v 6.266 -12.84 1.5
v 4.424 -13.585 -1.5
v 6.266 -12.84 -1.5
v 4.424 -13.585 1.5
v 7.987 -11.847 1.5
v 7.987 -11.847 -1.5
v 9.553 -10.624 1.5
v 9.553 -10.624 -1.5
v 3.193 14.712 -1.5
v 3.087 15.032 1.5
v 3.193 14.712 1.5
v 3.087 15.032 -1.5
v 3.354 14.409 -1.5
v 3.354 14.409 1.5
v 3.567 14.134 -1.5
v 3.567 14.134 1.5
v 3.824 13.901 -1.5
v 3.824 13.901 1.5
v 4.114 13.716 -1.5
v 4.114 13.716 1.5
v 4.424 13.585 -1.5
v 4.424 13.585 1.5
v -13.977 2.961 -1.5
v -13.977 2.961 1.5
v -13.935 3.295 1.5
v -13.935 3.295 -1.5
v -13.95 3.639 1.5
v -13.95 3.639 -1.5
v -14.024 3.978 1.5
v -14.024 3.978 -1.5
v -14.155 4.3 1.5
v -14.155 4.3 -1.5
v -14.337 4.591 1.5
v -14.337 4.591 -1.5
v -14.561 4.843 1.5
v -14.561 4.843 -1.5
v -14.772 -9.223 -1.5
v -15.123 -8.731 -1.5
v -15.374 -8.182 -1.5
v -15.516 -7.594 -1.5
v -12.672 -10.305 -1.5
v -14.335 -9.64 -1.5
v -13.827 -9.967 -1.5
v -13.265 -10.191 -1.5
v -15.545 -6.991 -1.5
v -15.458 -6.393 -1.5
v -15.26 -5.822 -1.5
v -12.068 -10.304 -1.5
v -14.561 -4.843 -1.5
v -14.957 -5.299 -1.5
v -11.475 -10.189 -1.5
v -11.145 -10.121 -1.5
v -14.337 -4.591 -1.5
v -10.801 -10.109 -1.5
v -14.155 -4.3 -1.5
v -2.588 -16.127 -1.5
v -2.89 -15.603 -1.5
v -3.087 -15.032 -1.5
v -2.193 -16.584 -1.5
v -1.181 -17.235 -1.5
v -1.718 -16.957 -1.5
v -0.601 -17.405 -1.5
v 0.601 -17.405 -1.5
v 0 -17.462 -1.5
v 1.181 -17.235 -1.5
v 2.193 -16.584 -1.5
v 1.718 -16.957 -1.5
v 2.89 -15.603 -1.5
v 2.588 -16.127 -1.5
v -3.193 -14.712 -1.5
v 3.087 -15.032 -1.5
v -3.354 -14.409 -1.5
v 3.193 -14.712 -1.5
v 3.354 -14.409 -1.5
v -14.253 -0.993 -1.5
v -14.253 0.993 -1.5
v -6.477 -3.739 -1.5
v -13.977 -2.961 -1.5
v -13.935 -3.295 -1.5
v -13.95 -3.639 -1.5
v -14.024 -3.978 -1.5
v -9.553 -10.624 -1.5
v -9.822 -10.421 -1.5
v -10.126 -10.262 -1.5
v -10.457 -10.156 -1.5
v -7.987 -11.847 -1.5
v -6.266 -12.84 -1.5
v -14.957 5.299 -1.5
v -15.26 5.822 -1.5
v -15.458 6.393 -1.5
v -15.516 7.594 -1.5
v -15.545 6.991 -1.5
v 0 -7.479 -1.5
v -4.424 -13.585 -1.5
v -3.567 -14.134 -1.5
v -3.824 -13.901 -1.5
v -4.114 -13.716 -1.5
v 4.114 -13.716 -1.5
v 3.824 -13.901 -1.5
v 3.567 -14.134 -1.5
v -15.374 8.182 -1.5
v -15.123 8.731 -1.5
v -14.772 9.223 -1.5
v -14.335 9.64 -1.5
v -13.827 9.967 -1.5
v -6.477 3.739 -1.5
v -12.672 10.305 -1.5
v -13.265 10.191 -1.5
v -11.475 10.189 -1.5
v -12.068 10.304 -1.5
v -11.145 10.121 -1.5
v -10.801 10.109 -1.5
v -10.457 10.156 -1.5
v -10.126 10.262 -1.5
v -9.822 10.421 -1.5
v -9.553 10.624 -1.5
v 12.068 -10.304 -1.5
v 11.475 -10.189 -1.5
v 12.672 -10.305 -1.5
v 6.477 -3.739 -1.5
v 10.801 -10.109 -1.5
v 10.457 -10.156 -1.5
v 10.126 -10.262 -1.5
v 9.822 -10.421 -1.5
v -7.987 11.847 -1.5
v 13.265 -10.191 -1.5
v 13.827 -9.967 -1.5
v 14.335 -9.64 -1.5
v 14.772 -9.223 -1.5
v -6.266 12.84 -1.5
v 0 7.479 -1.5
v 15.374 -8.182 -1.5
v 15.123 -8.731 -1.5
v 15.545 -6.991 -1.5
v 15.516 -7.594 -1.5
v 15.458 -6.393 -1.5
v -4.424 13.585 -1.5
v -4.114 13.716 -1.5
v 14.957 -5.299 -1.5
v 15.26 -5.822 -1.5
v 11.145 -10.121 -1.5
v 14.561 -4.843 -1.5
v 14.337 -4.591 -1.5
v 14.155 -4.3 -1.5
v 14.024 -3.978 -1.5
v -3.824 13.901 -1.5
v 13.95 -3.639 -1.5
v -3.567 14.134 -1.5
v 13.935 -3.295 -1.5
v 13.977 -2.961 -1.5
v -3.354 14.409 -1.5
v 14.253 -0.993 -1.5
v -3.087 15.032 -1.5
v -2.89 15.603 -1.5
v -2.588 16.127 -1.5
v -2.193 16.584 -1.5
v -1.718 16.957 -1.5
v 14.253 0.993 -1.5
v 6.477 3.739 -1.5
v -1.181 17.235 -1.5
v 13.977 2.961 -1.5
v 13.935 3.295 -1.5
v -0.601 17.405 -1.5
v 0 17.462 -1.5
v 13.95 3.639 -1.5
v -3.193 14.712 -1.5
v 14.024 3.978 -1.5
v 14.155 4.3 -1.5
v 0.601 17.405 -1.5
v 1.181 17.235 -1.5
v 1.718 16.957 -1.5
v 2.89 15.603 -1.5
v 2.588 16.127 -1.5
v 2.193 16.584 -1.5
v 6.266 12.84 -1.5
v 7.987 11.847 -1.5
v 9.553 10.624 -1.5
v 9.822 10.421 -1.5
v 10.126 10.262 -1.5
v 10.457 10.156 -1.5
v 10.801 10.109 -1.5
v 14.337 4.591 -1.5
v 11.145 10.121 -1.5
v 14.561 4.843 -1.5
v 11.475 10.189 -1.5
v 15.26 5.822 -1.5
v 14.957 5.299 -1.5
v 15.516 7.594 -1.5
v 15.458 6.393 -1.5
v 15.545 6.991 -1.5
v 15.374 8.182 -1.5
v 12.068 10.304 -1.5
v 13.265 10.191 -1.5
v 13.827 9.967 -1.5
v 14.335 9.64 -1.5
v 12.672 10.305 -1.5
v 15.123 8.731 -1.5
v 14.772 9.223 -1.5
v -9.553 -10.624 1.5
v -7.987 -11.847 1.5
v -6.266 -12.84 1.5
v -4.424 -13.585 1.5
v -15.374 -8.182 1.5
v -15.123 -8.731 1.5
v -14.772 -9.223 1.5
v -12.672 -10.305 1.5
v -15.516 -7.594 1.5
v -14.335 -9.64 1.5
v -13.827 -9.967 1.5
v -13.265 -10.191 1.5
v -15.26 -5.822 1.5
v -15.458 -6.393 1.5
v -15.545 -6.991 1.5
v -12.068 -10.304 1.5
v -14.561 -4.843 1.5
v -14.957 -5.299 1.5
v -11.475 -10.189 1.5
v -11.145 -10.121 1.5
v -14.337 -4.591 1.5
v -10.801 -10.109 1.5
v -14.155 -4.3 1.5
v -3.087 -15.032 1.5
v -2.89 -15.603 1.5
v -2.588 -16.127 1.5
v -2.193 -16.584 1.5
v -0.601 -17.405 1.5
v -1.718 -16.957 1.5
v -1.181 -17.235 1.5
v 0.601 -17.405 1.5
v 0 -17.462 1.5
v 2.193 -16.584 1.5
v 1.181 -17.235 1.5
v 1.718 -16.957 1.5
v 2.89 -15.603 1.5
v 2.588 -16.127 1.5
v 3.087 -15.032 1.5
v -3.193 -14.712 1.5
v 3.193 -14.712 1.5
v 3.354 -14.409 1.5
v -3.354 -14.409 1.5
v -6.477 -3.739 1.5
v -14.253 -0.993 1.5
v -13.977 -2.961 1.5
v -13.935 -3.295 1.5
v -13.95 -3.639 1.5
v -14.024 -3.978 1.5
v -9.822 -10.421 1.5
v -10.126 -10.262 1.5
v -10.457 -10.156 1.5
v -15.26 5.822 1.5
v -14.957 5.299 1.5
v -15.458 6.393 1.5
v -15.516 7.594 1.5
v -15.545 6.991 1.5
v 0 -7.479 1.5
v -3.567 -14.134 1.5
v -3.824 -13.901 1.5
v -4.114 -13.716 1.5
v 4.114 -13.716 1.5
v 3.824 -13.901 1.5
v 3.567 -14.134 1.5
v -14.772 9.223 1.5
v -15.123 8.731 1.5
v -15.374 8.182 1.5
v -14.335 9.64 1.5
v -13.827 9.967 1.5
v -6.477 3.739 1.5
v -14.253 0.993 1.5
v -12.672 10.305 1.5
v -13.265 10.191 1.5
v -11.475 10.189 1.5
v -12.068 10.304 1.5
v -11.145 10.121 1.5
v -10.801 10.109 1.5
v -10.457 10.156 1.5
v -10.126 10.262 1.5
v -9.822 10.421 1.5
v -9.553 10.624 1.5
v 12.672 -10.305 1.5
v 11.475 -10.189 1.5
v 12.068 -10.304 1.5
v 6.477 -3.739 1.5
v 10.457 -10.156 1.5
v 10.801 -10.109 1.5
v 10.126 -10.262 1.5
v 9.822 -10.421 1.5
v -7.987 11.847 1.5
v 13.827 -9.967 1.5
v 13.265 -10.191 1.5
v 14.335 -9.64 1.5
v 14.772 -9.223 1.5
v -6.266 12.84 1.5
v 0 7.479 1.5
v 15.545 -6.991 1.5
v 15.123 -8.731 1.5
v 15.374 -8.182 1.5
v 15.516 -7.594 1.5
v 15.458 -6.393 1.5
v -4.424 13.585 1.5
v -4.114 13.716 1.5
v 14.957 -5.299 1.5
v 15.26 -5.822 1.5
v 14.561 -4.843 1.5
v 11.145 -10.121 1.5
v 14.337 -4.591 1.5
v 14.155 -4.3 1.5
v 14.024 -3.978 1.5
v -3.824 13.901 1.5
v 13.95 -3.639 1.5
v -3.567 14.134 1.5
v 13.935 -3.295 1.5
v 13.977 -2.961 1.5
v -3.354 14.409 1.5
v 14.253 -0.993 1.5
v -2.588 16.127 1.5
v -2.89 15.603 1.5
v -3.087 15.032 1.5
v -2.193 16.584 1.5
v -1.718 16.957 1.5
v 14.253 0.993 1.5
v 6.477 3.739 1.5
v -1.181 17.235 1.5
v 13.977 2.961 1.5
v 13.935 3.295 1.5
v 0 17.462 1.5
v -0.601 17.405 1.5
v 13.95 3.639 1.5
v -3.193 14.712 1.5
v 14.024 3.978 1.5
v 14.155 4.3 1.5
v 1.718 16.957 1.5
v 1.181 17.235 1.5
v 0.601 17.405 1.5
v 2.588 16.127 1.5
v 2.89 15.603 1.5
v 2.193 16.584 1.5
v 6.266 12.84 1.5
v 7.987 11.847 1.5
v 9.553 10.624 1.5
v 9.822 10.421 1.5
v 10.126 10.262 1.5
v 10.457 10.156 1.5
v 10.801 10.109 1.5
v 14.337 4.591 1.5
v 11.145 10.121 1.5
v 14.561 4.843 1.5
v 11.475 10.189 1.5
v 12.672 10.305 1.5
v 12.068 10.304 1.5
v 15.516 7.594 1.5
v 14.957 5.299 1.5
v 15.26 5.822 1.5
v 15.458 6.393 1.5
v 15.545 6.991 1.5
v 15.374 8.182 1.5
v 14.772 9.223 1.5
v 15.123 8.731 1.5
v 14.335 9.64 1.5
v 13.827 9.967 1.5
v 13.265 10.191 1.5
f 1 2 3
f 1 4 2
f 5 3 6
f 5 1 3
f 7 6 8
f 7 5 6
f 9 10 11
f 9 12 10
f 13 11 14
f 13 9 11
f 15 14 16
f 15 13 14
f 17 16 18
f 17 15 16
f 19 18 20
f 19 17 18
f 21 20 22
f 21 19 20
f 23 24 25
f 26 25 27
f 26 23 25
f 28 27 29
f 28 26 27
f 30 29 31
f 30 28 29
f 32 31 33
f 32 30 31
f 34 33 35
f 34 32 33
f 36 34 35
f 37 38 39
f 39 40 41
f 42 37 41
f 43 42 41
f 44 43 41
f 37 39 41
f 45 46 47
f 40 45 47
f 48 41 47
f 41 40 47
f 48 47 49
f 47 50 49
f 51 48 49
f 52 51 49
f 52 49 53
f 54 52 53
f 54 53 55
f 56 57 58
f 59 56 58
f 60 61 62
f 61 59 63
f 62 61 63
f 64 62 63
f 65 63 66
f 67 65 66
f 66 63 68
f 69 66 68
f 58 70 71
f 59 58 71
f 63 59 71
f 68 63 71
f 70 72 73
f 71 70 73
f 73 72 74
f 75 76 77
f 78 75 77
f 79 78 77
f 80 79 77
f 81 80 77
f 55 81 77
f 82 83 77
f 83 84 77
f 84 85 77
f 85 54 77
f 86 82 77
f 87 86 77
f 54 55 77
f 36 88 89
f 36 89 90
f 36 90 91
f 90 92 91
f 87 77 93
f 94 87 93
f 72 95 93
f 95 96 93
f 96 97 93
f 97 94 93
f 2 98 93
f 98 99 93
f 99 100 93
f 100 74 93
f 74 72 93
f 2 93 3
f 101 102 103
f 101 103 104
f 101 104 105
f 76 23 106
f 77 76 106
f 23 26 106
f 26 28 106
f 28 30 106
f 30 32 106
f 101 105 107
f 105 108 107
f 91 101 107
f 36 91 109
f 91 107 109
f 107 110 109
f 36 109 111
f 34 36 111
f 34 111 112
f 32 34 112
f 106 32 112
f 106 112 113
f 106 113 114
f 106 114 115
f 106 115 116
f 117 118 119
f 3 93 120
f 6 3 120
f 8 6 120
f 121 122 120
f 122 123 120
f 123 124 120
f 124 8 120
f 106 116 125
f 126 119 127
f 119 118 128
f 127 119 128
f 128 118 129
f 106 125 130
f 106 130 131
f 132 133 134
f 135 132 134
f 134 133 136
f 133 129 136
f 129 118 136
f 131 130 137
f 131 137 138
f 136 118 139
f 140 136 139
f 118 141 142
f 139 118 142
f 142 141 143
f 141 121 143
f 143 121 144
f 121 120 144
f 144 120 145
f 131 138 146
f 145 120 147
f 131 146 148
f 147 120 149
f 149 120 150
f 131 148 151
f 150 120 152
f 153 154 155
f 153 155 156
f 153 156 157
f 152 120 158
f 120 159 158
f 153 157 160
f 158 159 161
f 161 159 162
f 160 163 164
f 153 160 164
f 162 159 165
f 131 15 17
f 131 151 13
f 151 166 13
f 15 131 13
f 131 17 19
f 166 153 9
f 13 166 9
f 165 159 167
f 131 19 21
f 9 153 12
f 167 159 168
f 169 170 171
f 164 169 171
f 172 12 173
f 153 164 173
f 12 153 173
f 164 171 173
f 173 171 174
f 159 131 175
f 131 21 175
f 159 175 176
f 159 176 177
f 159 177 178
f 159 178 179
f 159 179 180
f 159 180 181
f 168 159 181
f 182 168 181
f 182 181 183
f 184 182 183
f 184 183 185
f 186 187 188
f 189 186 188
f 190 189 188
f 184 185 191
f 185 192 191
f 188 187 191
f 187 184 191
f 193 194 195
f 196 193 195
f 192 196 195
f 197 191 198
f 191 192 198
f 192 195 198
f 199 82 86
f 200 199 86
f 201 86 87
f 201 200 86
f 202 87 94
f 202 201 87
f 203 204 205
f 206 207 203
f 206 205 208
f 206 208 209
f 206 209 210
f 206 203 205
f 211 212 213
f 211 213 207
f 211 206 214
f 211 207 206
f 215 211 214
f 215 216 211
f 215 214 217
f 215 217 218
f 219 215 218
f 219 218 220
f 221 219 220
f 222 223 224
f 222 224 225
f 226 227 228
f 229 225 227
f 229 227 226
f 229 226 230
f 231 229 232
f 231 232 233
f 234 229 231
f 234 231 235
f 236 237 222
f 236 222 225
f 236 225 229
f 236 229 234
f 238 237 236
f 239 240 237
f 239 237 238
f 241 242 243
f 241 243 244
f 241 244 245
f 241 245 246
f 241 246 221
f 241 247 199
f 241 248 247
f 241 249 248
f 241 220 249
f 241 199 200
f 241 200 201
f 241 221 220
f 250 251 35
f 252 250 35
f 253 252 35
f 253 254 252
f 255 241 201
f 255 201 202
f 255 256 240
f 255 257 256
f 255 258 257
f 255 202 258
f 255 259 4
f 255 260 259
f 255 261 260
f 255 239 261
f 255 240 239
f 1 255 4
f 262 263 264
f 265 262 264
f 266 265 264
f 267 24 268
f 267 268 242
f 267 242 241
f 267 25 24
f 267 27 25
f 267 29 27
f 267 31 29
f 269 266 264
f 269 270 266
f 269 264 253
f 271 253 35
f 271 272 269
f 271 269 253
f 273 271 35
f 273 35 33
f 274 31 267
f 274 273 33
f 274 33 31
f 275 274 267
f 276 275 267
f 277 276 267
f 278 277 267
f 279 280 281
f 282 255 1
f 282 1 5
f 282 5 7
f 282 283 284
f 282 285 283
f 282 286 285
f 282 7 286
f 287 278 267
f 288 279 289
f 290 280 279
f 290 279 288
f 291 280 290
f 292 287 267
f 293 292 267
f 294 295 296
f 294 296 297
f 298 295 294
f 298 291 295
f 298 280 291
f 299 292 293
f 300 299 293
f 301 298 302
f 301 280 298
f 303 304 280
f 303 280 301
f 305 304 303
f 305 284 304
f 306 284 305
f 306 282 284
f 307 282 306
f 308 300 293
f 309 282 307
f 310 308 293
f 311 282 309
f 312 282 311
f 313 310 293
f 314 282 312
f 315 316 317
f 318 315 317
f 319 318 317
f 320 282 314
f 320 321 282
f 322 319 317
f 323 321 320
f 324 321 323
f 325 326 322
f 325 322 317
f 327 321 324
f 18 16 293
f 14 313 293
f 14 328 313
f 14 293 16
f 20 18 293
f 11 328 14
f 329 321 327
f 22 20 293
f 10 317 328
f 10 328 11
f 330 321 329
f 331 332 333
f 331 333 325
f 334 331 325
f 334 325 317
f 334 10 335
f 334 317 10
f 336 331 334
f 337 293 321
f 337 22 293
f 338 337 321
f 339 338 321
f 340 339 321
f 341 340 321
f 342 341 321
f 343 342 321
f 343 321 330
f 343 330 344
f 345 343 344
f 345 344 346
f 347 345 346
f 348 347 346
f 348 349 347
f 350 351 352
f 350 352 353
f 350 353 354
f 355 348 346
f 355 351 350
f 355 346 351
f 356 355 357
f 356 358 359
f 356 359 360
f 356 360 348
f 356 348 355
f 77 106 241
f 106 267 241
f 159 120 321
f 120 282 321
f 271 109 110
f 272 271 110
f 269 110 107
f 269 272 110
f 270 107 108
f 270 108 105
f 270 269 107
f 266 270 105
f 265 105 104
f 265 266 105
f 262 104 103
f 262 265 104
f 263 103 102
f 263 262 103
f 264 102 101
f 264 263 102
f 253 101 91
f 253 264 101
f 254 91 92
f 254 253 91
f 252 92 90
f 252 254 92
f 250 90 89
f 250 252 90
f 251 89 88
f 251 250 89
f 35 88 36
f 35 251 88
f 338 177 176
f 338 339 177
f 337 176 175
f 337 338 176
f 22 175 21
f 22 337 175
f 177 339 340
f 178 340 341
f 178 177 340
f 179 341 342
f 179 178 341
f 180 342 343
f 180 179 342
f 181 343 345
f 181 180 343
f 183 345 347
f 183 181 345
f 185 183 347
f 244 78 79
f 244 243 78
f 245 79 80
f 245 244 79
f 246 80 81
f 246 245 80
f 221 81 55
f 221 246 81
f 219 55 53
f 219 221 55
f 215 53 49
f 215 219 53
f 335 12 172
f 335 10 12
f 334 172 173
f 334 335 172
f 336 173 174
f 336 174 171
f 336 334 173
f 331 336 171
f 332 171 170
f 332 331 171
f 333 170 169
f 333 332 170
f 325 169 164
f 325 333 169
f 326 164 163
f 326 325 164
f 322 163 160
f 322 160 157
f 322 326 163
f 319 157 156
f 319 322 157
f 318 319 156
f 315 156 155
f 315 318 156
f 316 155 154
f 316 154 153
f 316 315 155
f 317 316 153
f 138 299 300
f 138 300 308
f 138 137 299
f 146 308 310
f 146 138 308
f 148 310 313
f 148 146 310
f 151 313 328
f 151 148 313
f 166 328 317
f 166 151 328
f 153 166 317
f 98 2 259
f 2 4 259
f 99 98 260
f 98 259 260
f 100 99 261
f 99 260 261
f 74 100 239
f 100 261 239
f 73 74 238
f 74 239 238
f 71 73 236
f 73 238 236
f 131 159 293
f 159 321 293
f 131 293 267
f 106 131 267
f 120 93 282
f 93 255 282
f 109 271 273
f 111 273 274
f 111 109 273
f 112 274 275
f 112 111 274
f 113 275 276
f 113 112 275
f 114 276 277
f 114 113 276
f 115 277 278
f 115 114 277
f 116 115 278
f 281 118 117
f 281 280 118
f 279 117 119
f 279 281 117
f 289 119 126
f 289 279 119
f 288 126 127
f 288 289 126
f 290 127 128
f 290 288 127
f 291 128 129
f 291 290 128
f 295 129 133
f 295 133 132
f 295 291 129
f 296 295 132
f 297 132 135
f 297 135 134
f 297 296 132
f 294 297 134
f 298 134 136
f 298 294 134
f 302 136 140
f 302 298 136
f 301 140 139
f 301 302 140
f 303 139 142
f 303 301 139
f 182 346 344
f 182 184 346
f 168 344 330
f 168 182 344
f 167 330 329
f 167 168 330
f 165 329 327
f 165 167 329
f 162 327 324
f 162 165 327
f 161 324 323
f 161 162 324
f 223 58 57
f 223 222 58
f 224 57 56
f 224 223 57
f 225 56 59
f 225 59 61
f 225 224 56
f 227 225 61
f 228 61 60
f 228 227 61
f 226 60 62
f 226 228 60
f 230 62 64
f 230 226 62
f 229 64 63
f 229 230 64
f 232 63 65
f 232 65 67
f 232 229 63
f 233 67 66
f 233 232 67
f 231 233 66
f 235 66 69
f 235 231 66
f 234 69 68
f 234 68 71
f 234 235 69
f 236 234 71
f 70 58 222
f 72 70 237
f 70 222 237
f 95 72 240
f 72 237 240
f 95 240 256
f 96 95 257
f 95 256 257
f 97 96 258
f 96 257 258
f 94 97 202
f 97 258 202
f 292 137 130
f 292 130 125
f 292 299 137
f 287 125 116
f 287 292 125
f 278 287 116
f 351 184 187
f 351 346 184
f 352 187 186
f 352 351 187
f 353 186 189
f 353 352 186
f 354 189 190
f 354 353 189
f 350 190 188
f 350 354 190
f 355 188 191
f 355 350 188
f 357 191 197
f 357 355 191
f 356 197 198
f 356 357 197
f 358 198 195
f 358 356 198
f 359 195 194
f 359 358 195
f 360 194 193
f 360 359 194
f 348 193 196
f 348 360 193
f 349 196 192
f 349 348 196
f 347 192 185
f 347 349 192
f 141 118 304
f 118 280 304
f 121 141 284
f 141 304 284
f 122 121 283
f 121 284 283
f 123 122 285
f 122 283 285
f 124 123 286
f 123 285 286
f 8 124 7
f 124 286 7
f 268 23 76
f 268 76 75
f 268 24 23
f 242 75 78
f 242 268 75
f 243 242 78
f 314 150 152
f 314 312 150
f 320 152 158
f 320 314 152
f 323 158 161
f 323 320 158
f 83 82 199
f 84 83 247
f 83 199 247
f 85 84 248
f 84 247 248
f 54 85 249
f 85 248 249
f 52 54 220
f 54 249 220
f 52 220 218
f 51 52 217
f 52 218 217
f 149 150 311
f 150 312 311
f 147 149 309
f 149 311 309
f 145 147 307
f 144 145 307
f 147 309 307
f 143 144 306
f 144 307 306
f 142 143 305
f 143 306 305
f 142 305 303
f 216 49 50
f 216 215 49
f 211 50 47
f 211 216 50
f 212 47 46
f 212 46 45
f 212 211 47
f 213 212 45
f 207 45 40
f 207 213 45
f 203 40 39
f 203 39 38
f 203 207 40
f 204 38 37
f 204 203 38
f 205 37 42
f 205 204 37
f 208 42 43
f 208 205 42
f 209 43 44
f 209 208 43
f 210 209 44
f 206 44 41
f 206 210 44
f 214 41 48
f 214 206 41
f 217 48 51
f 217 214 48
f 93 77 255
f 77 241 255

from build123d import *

# Parameters (mm, degrees)
BOSS_EXTRUDE1_DEPTH = 1.499997
FILLET1_R           = 2.0193


with BuildPart() as part:
    # Sketch1 → Boss-Extrude1 (new, symmetric)
    with BuildSketch(Plane.XY):
        with BuildLine():
            ThreePointArc((-13.645493623, 4.234756195), (-14.2875, 0), (-13.645493623, -4.234756195))
            ThreePointArc((-13.645493623, -4.234756195), (-15.122968614, -8.73125), (-10.490153255, -9.699966028))
            ThreePointArc((-10.490153255, -9.699966028), (-7.14375, -12.373337957), (-3.155340368, -13.934722222))
            ThreePointArc((-3.155340368, -13.934722222), (0, -17.4625), (3.155340368, -13.934722222))
            ThreePointArc((3.155340368, -13.934722222), (7.14375, -12.373337957), (10.490153255, -9.699966028))
            ThreePointArc((10.490153255, -9.699966028), (15.122968614, -8.73125), (13.645493623, -4.234756195))
            ThreePointArc((13.645493623, -4.234756195), (14.2875, 0), (13.645493623, 4.234756195))
            ThreePointArc((13.645493623, 4.234756195), (15.122968614, 8.73125), (10.490153255, 9.699966028))
            ThreePointArc((10.490153255, 9.699966028), (7.14375, 12.373337957), (3.155340368, 13.934722222))
            ThreePointArc((3.155340368, 13.934722222), (0, 17.4625), (-3.155340368, 13.934722222))
            ThreePointArc((-3.155340368, 13.934722222), (-7.14375, 12.373337957), (-10.490153255, 9.699966028))
            ThreePointArc((-10.490153255, 9.699966028), (-15.122968614, 8.73125), (-13.645493623, 4.234756195))
        make_face()
        Polygon((0, 7.478995387), (-6.477, 3.739497694), (-6.477, -3.739497694), (0, -7.478995387), (6.477, -3.739497694), (6.477, 3.739497694), align=None, mode=Mode.SUBTRACT)
    extrude(amount=BOSS_EXTRUDE1_DEPTH, both=True)

    # Fillet1
    fillet1_edges = [part.edges().sort_by_distance(p)[0] for p in [
        (10.490153255, 9.699966028, 0),
        (13.645493623, 4.234756195, 0),
        (13.645493623, -4.234756195, 0),
        (10.490153255, -9.699966028, 0),
        (3.155340368, -13.934722222, 0),
        (-3.155340368, -13.934722222, 0),
        (-10.490153255, -9.699966028, 0),
        (-13.645493623, -4.234756195, 0),
        (-13.645493623, 4.234756195, 0),
        (-10.490153255, 9.699966028, 0),
        (-3.155340368, 13.934722222, 0),
        (3.155340368, 13.934722222, 0),
    ]]
    fillet(fillet1_edges, radius=FILLET1_R)


solid = part.part
